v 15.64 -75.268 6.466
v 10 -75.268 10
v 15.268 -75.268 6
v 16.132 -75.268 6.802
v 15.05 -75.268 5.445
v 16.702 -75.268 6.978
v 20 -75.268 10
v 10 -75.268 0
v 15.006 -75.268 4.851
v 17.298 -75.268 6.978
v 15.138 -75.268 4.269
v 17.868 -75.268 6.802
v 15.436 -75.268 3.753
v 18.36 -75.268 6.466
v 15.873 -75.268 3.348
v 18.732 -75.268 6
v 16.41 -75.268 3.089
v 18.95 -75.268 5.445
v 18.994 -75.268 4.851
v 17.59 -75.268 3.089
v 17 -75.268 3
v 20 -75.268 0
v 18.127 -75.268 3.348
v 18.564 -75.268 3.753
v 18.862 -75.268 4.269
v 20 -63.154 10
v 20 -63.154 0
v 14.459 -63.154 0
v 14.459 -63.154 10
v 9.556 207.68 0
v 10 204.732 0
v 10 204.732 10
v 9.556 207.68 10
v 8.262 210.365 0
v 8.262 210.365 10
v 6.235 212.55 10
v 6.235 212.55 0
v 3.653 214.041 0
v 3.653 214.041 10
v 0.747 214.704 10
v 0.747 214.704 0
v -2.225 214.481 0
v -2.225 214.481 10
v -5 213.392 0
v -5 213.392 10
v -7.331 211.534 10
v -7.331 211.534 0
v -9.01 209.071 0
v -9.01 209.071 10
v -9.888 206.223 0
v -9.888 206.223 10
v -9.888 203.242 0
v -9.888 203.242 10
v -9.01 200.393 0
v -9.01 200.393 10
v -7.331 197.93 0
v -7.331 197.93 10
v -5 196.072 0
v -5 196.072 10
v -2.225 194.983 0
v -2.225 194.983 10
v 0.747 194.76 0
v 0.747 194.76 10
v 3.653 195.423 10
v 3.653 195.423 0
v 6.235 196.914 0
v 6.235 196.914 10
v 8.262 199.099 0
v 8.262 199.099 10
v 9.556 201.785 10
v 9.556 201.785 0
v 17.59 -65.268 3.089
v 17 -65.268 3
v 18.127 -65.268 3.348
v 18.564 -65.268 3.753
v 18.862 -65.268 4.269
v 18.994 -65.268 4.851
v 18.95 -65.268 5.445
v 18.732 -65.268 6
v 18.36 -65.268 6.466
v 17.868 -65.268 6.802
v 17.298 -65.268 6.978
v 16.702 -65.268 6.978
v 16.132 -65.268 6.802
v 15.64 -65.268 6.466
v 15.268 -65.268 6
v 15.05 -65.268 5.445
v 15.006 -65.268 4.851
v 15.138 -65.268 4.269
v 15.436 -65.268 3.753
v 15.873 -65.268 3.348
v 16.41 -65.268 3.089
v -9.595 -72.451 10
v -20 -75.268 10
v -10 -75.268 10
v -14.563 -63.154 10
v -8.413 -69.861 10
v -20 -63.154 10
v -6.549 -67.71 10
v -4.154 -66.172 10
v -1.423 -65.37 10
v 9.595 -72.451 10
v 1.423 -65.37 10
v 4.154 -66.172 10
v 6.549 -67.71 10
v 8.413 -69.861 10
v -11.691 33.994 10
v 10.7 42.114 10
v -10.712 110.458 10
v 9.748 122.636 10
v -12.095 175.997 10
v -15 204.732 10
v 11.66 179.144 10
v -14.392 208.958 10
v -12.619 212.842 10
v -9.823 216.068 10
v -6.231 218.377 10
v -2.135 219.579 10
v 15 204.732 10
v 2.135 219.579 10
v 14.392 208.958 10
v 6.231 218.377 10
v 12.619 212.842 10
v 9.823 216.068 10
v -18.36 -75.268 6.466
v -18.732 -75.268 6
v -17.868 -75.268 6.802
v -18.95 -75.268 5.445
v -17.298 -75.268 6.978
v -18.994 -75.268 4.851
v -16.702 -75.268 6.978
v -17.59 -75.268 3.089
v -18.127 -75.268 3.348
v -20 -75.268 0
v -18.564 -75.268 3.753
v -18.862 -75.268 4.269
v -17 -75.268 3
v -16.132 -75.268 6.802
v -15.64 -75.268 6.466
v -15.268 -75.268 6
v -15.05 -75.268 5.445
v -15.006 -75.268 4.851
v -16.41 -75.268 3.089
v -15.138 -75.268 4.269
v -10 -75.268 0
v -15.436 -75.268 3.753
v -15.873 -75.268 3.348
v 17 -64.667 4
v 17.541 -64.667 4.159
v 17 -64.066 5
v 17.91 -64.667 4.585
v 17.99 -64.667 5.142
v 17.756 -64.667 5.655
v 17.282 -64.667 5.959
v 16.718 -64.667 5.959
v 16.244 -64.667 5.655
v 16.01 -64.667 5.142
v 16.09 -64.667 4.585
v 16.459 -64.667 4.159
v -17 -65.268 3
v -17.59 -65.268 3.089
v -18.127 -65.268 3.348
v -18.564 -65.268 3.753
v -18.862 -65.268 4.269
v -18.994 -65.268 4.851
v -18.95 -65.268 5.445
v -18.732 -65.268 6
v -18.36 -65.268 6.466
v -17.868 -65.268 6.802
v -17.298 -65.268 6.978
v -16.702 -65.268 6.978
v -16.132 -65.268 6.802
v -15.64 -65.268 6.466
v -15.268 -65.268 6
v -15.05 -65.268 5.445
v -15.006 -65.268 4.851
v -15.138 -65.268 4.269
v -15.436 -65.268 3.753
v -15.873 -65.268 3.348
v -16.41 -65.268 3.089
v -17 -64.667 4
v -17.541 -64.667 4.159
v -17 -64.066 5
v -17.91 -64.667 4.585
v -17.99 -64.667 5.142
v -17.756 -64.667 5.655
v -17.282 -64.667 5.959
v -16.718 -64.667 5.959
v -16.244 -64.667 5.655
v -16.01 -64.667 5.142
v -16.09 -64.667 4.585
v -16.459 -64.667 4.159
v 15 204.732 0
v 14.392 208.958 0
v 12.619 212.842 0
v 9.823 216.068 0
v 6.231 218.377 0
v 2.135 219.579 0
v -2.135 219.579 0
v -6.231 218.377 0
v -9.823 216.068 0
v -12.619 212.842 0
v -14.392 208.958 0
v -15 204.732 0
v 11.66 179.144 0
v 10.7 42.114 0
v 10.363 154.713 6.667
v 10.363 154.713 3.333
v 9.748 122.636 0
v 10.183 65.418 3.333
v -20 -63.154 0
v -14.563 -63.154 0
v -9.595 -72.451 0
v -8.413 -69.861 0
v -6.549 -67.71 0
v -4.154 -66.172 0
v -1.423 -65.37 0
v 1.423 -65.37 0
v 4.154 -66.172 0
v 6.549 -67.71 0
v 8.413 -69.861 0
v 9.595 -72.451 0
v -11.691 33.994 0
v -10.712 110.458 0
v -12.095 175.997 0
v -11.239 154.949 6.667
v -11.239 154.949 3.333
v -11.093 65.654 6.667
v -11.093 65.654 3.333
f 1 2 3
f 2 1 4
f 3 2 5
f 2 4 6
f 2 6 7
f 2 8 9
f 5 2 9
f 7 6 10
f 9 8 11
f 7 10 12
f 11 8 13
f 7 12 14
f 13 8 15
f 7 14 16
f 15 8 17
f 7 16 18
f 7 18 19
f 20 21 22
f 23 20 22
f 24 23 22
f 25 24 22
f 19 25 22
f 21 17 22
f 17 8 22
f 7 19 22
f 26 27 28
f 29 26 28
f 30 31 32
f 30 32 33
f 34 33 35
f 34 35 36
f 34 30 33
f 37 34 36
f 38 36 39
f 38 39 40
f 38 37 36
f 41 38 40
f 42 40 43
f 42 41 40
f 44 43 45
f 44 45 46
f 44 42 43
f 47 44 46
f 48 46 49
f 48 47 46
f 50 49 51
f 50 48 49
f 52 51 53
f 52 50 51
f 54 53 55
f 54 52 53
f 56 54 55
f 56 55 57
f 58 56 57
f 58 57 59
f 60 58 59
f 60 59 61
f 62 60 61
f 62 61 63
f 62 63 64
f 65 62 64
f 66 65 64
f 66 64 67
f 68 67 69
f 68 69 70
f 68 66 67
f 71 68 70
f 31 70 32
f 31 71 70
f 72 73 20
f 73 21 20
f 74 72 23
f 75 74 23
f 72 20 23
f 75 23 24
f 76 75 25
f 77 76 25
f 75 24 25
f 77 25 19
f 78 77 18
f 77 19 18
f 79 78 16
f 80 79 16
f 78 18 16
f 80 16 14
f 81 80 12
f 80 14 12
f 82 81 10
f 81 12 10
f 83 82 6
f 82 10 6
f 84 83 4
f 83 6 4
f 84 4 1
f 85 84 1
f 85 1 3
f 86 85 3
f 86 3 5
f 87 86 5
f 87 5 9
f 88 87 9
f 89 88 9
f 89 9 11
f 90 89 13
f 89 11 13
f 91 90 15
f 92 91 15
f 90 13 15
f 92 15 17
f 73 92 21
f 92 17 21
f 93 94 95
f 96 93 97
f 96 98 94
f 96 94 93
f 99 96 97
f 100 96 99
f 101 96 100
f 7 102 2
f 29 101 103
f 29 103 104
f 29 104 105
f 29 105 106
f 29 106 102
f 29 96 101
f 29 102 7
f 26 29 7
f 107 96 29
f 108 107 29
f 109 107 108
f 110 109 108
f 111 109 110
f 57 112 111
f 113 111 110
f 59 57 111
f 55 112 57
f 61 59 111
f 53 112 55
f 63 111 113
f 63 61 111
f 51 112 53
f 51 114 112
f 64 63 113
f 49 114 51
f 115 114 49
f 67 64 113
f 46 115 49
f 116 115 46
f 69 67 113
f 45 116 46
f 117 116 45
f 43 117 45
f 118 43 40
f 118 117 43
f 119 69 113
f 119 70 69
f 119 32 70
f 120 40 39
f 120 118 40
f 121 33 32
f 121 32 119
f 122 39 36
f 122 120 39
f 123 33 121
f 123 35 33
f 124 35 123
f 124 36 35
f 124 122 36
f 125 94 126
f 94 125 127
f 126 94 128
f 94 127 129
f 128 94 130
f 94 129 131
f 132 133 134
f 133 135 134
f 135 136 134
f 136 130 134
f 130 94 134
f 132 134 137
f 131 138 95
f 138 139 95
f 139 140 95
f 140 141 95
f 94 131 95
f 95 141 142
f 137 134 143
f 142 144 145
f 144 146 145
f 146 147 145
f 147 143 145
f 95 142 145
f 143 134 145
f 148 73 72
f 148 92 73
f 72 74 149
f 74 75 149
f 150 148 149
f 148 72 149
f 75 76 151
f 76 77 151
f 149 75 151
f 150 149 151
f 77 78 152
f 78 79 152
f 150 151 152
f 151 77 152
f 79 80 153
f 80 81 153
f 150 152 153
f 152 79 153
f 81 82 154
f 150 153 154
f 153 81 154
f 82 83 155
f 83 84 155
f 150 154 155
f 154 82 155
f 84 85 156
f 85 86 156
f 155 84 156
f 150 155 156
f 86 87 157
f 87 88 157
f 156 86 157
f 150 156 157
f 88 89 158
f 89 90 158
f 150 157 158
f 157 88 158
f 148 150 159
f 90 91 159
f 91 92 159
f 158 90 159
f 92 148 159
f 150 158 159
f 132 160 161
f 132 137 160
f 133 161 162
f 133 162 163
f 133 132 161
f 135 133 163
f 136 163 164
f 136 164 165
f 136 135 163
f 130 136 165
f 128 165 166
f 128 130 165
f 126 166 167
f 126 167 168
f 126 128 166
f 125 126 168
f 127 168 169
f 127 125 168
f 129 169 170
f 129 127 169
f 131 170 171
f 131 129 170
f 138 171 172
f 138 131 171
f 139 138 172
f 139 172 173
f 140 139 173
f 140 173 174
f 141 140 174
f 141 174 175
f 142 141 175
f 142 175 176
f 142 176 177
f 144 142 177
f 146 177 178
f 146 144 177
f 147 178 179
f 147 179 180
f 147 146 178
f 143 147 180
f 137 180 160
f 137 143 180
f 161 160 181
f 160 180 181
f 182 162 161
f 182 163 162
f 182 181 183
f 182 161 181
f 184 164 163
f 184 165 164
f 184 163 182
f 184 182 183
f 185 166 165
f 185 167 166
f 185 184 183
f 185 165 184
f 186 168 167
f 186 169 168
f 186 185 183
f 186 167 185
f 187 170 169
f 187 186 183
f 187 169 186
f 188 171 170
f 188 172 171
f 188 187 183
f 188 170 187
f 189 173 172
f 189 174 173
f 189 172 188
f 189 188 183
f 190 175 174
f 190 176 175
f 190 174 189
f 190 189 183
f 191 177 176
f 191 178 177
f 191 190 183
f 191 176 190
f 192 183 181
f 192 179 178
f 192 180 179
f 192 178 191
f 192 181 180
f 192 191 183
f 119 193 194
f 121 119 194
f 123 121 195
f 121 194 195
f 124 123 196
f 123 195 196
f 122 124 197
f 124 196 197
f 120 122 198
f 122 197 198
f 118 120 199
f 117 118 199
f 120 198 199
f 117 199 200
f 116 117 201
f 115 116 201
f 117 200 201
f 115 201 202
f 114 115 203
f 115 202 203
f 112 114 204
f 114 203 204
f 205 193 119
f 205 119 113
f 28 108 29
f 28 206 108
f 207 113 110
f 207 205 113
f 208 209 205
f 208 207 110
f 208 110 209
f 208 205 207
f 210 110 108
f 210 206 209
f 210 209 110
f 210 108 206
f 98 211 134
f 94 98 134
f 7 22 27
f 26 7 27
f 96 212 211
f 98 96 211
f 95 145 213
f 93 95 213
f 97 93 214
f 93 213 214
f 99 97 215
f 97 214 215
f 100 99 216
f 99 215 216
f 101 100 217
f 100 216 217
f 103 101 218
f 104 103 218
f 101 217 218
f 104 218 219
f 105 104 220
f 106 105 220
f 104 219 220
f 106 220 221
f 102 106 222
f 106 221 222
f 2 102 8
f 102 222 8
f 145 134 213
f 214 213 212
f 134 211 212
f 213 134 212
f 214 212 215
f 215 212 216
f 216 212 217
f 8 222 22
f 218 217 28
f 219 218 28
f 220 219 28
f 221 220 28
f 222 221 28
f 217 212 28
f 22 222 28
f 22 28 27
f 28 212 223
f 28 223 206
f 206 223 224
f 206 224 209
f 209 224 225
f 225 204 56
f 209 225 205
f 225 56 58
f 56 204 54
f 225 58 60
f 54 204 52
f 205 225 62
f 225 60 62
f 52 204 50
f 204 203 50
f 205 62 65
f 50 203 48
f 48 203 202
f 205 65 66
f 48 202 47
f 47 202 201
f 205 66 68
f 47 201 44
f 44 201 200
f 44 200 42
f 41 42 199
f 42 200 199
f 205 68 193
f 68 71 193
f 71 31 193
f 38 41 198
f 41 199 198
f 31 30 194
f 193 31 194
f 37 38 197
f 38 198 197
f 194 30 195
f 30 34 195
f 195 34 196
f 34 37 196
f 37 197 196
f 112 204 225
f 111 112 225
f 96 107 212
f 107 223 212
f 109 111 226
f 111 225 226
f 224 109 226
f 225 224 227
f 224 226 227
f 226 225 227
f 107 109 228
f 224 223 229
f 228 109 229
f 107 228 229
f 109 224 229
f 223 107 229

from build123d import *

# Parameters (mm, degrees)
SKETCH1_R           = 10
BOSS_EXTRUDE1_DEPTH = 10


with BuildPart() as part:
    # Sketch1 → Boss-Extrude1 (new body)
    with BuildSketch(Plane.XY):
        with BuildLine():
            Line((-15, -75.267843328), (-10, -75.267843328))
            ThreePointArc((-10, -75.267843328), (0, -65.267843328), (10, -75.267843328))
            Line((10, -75.267843328), (15, -75.267843328))
            Line((15, -75.267843328), (20, -75.267843328))
            Line((20, -75.267843328), (20, -63.153600369))
            Line((20, -63.153600369), (14.459340055, -63.153600369))
            add(Edge.make_bspline(
                [(15, 204.732156672), (8.134301698, 174.35100944), (7.954081716, 85.055757093), (14.459340055, -63.153600369)],
                knots=[0, 0, 0, 0, 0.97375067, 0.97375067, 0.97375067, 0.97375067], degree=3))
            ThreePointArc((15, 204.732156672), (0, 219.732156672), (-15, 204.732156672))
            add(Edge.make_bspline(
                [(-15, 204.732156672), (-9.431523273, 174.705672452), (-9.285696116, 85.410420106), (-14.56251853, -63.153600369)],
                knots=[0, 0, 0, 0, 0.97381202, 0.97381202, 0.97381202, 0.97381202], degree=3))
            Line((-14.56251853, -63.153600369), (-20, -63.153600369))
            Line((-20, -63.153600369), (-20, -75.267843328))
            Line((-20, -75.267843328), (-15, -75.267843328))
        make_face()
        with Locations((0, 204.732156672)):
            Circle(SKETCH1_R, mode=Mode.SUBTRACT)
    extrude(amount=BOSS_EXTRUDE1_DEPTH)

    # Sketch7 → Ø4.0 (4) Diameter Hole2 (revolve, cut)
    with BuildSketch(Plane(origin=(-17, -75.267843328, 5), x_dir=(0, 0, -1), z_dir=(1, 0, 0))):
        Polygon((0, 0), (0, 11.201721238), (2, 10), (2, 0), align=None)
    f_4_0_4_diameter_hole2 = revolve(axis=Axis((-17, -81.617843328, 5), (0, 1, 0)), mode=Mode.SUBTRACT)

    # Mirror2: Ø4.0 (4) Diameter Hole2 across plane
    add(f_4_0_4_diameter_hole2.mirror(Plane(origin=(0, 0, 0), x_dir=(0, 0, 1), z_dir=(1, 0, 0))), mode=Mode.SUBTRACT)


solid = part.part
